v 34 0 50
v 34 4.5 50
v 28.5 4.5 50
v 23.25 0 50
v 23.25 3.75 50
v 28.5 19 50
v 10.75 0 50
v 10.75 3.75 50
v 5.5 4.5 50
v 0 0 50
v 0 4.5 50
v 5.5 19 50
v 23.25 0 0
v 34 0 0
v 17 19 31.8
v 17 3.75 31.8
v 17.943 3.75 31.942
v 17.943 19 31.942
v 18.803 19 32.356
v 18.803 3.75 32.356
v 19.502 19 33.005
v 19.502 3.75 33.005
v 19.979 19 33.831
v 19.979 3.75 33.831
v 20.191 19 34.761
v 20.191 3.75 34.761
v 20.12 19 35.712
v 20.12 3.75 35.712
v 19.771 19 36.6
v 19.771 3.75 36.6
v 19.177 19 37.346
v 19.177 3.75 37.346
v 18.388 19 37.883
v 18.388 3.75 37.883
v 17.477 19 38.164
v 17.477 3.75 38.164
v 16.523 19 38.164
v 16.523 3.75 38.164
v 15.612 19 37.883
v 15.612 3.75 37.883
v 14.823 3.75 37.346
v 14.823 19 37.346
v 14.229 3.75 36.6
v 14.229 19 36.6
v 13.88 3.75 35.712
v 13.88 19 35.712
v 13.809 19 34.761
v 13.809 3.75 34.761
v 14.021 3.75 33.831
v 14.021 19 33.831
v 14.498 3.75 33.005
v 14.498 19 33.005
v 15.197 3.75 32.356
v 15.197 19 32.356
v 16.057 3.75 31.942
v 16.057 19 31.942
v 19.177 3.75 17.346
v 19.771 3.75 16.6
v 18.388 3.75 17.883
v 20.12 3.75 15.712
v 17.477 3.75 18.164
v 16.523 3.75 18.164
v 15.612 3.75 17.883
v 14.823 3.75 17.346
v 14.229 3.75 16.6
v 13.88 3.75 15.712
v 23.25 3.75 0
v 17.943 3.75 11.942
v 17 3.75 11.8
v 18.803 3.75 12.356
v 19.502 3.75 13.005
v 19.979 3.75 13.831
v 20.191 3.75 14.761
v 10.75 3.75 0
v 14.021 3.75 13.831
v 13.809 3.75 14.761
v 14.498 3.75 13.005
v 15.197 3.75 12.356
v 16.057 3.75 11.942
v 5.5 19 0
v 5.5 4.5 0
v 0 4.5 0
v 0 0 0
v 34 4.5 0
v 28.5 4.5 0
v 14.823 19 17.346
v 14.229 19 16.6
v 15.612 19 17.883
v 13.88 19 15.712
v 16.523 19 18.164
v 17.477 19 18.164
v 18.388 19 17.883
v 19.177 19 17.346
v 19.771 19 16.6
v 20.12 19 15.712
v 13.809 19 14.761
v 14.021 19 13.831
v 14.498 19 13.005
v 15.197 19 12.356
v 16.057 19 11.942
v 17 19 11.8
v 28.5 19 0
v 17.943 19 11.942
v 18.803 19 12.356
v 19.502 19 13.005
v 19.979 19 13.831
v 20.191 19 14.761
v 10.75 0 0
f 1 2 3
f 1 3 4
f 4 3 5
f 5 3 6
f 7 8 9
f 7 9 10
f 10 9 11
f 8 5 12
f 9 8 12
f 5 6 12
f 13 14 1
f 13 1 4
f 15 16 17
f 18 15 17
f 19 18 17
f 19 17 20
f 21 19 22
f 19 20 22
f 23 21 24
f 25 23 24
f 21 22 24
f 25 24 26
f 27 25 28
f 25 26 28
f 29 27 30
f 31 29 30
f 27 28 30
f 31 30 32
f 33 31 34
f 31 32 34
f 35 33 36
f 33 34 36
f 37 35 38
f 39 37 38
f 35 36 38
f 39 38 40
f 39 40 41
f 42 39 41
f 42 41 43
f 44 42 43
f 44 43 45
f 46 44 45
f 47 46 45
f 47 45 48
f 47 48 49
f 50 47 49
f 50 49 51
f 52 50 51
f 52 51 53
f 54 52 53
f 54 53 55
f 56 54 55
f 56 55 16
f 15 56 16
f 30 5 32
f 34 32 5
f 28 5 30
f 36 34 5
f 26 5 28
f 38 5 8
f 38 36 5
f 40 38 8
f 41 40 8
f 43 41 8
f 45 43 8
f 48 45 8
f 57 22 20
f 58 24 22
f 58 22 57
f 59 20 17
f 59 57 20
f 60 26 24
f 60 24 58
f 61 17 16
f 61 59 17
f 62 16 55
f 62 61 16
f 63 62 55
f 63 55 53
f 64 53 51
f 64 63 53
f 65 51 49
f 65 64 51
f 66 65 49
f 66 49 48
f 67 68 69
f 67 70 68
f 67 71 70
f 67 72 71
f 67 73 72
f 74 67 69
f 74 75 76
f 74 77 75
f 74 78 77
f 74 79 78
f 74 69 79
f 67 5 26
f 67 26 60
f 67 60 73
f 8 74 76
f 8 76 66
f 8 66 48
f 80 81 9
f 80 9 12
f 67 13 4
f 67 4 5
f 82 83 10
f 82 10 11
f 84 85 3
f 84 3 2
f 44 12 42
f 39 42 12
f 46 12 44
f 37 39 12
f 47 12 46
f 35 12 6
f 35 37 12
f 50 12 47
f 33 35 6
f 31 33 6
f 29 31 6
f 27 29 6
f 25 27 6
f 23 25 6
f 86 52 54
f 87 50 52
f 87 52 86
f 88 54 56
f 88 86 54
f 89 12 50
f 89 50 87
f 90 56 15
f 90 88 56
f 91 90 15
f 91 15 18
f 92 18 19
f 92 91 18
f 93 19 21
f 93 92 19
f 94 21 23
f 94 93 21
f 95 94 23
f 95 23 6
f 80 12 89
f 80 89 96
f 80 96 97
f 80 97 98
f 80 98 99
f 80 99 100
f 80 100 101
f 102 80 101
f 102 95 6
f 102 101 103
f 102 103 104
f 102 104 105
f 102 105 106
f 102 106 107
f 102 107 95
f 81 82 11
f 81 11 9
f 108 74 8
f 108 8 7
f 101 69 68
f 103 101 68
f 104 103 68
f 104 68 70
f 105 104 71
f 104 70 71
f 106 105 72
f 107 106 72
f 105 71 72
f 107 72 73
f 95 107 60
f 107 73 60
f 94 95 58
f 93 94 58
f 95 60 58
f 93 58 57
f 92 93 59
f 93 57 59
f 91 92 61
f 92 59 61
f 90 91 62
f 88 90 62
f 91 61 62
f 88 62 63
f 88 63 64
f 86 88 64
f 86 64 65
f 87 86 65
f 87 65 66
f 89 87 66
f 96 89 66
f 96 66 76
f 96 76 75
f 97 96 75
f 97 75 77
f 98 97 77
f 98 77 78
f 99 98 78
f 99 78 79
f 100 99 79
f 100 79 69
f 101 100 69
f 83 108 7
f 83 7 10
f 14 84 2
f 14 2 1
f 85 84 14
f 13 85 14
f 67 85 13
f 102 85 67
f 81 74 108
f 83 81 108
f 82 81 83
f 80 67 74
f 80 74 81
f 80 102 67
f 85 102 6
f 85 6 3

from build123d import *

# Parameters (mm, degrees)
BOSS_EXTRUDE1_DEPTH  = 50
M6_CLEARANCE_HOLE1_D = 6.4


with BuildPart() as part:
    # Sketch1 → Boss-Extrude1 (new body)
    with BuildSketch(Plane.XY):
        Polygon((0, 0), (0, 4.5), (5.5, 4.5), (5.5, 19), (28.5, 19), (28.5, 4.5), (34, 4.5), (34, 0), (23.25, 0), (23.25, 3.75), (10.75, 3.75), (10.75, 0), align=None)
    extrude(amount=BOSS_EXTRUDE1_DEPTH)

    # M6 Clearance Hole1 (through all)
    with Locations(Plane(origin=(17, 19, 15), x_dir=(0, 0, 1), z_dir=(0, 1, 0))):
        with Locations((0, 0), (20, 0)):
            Hole(M6_CLEARANCE_HOLE1_D / 2)


solid = part.part
